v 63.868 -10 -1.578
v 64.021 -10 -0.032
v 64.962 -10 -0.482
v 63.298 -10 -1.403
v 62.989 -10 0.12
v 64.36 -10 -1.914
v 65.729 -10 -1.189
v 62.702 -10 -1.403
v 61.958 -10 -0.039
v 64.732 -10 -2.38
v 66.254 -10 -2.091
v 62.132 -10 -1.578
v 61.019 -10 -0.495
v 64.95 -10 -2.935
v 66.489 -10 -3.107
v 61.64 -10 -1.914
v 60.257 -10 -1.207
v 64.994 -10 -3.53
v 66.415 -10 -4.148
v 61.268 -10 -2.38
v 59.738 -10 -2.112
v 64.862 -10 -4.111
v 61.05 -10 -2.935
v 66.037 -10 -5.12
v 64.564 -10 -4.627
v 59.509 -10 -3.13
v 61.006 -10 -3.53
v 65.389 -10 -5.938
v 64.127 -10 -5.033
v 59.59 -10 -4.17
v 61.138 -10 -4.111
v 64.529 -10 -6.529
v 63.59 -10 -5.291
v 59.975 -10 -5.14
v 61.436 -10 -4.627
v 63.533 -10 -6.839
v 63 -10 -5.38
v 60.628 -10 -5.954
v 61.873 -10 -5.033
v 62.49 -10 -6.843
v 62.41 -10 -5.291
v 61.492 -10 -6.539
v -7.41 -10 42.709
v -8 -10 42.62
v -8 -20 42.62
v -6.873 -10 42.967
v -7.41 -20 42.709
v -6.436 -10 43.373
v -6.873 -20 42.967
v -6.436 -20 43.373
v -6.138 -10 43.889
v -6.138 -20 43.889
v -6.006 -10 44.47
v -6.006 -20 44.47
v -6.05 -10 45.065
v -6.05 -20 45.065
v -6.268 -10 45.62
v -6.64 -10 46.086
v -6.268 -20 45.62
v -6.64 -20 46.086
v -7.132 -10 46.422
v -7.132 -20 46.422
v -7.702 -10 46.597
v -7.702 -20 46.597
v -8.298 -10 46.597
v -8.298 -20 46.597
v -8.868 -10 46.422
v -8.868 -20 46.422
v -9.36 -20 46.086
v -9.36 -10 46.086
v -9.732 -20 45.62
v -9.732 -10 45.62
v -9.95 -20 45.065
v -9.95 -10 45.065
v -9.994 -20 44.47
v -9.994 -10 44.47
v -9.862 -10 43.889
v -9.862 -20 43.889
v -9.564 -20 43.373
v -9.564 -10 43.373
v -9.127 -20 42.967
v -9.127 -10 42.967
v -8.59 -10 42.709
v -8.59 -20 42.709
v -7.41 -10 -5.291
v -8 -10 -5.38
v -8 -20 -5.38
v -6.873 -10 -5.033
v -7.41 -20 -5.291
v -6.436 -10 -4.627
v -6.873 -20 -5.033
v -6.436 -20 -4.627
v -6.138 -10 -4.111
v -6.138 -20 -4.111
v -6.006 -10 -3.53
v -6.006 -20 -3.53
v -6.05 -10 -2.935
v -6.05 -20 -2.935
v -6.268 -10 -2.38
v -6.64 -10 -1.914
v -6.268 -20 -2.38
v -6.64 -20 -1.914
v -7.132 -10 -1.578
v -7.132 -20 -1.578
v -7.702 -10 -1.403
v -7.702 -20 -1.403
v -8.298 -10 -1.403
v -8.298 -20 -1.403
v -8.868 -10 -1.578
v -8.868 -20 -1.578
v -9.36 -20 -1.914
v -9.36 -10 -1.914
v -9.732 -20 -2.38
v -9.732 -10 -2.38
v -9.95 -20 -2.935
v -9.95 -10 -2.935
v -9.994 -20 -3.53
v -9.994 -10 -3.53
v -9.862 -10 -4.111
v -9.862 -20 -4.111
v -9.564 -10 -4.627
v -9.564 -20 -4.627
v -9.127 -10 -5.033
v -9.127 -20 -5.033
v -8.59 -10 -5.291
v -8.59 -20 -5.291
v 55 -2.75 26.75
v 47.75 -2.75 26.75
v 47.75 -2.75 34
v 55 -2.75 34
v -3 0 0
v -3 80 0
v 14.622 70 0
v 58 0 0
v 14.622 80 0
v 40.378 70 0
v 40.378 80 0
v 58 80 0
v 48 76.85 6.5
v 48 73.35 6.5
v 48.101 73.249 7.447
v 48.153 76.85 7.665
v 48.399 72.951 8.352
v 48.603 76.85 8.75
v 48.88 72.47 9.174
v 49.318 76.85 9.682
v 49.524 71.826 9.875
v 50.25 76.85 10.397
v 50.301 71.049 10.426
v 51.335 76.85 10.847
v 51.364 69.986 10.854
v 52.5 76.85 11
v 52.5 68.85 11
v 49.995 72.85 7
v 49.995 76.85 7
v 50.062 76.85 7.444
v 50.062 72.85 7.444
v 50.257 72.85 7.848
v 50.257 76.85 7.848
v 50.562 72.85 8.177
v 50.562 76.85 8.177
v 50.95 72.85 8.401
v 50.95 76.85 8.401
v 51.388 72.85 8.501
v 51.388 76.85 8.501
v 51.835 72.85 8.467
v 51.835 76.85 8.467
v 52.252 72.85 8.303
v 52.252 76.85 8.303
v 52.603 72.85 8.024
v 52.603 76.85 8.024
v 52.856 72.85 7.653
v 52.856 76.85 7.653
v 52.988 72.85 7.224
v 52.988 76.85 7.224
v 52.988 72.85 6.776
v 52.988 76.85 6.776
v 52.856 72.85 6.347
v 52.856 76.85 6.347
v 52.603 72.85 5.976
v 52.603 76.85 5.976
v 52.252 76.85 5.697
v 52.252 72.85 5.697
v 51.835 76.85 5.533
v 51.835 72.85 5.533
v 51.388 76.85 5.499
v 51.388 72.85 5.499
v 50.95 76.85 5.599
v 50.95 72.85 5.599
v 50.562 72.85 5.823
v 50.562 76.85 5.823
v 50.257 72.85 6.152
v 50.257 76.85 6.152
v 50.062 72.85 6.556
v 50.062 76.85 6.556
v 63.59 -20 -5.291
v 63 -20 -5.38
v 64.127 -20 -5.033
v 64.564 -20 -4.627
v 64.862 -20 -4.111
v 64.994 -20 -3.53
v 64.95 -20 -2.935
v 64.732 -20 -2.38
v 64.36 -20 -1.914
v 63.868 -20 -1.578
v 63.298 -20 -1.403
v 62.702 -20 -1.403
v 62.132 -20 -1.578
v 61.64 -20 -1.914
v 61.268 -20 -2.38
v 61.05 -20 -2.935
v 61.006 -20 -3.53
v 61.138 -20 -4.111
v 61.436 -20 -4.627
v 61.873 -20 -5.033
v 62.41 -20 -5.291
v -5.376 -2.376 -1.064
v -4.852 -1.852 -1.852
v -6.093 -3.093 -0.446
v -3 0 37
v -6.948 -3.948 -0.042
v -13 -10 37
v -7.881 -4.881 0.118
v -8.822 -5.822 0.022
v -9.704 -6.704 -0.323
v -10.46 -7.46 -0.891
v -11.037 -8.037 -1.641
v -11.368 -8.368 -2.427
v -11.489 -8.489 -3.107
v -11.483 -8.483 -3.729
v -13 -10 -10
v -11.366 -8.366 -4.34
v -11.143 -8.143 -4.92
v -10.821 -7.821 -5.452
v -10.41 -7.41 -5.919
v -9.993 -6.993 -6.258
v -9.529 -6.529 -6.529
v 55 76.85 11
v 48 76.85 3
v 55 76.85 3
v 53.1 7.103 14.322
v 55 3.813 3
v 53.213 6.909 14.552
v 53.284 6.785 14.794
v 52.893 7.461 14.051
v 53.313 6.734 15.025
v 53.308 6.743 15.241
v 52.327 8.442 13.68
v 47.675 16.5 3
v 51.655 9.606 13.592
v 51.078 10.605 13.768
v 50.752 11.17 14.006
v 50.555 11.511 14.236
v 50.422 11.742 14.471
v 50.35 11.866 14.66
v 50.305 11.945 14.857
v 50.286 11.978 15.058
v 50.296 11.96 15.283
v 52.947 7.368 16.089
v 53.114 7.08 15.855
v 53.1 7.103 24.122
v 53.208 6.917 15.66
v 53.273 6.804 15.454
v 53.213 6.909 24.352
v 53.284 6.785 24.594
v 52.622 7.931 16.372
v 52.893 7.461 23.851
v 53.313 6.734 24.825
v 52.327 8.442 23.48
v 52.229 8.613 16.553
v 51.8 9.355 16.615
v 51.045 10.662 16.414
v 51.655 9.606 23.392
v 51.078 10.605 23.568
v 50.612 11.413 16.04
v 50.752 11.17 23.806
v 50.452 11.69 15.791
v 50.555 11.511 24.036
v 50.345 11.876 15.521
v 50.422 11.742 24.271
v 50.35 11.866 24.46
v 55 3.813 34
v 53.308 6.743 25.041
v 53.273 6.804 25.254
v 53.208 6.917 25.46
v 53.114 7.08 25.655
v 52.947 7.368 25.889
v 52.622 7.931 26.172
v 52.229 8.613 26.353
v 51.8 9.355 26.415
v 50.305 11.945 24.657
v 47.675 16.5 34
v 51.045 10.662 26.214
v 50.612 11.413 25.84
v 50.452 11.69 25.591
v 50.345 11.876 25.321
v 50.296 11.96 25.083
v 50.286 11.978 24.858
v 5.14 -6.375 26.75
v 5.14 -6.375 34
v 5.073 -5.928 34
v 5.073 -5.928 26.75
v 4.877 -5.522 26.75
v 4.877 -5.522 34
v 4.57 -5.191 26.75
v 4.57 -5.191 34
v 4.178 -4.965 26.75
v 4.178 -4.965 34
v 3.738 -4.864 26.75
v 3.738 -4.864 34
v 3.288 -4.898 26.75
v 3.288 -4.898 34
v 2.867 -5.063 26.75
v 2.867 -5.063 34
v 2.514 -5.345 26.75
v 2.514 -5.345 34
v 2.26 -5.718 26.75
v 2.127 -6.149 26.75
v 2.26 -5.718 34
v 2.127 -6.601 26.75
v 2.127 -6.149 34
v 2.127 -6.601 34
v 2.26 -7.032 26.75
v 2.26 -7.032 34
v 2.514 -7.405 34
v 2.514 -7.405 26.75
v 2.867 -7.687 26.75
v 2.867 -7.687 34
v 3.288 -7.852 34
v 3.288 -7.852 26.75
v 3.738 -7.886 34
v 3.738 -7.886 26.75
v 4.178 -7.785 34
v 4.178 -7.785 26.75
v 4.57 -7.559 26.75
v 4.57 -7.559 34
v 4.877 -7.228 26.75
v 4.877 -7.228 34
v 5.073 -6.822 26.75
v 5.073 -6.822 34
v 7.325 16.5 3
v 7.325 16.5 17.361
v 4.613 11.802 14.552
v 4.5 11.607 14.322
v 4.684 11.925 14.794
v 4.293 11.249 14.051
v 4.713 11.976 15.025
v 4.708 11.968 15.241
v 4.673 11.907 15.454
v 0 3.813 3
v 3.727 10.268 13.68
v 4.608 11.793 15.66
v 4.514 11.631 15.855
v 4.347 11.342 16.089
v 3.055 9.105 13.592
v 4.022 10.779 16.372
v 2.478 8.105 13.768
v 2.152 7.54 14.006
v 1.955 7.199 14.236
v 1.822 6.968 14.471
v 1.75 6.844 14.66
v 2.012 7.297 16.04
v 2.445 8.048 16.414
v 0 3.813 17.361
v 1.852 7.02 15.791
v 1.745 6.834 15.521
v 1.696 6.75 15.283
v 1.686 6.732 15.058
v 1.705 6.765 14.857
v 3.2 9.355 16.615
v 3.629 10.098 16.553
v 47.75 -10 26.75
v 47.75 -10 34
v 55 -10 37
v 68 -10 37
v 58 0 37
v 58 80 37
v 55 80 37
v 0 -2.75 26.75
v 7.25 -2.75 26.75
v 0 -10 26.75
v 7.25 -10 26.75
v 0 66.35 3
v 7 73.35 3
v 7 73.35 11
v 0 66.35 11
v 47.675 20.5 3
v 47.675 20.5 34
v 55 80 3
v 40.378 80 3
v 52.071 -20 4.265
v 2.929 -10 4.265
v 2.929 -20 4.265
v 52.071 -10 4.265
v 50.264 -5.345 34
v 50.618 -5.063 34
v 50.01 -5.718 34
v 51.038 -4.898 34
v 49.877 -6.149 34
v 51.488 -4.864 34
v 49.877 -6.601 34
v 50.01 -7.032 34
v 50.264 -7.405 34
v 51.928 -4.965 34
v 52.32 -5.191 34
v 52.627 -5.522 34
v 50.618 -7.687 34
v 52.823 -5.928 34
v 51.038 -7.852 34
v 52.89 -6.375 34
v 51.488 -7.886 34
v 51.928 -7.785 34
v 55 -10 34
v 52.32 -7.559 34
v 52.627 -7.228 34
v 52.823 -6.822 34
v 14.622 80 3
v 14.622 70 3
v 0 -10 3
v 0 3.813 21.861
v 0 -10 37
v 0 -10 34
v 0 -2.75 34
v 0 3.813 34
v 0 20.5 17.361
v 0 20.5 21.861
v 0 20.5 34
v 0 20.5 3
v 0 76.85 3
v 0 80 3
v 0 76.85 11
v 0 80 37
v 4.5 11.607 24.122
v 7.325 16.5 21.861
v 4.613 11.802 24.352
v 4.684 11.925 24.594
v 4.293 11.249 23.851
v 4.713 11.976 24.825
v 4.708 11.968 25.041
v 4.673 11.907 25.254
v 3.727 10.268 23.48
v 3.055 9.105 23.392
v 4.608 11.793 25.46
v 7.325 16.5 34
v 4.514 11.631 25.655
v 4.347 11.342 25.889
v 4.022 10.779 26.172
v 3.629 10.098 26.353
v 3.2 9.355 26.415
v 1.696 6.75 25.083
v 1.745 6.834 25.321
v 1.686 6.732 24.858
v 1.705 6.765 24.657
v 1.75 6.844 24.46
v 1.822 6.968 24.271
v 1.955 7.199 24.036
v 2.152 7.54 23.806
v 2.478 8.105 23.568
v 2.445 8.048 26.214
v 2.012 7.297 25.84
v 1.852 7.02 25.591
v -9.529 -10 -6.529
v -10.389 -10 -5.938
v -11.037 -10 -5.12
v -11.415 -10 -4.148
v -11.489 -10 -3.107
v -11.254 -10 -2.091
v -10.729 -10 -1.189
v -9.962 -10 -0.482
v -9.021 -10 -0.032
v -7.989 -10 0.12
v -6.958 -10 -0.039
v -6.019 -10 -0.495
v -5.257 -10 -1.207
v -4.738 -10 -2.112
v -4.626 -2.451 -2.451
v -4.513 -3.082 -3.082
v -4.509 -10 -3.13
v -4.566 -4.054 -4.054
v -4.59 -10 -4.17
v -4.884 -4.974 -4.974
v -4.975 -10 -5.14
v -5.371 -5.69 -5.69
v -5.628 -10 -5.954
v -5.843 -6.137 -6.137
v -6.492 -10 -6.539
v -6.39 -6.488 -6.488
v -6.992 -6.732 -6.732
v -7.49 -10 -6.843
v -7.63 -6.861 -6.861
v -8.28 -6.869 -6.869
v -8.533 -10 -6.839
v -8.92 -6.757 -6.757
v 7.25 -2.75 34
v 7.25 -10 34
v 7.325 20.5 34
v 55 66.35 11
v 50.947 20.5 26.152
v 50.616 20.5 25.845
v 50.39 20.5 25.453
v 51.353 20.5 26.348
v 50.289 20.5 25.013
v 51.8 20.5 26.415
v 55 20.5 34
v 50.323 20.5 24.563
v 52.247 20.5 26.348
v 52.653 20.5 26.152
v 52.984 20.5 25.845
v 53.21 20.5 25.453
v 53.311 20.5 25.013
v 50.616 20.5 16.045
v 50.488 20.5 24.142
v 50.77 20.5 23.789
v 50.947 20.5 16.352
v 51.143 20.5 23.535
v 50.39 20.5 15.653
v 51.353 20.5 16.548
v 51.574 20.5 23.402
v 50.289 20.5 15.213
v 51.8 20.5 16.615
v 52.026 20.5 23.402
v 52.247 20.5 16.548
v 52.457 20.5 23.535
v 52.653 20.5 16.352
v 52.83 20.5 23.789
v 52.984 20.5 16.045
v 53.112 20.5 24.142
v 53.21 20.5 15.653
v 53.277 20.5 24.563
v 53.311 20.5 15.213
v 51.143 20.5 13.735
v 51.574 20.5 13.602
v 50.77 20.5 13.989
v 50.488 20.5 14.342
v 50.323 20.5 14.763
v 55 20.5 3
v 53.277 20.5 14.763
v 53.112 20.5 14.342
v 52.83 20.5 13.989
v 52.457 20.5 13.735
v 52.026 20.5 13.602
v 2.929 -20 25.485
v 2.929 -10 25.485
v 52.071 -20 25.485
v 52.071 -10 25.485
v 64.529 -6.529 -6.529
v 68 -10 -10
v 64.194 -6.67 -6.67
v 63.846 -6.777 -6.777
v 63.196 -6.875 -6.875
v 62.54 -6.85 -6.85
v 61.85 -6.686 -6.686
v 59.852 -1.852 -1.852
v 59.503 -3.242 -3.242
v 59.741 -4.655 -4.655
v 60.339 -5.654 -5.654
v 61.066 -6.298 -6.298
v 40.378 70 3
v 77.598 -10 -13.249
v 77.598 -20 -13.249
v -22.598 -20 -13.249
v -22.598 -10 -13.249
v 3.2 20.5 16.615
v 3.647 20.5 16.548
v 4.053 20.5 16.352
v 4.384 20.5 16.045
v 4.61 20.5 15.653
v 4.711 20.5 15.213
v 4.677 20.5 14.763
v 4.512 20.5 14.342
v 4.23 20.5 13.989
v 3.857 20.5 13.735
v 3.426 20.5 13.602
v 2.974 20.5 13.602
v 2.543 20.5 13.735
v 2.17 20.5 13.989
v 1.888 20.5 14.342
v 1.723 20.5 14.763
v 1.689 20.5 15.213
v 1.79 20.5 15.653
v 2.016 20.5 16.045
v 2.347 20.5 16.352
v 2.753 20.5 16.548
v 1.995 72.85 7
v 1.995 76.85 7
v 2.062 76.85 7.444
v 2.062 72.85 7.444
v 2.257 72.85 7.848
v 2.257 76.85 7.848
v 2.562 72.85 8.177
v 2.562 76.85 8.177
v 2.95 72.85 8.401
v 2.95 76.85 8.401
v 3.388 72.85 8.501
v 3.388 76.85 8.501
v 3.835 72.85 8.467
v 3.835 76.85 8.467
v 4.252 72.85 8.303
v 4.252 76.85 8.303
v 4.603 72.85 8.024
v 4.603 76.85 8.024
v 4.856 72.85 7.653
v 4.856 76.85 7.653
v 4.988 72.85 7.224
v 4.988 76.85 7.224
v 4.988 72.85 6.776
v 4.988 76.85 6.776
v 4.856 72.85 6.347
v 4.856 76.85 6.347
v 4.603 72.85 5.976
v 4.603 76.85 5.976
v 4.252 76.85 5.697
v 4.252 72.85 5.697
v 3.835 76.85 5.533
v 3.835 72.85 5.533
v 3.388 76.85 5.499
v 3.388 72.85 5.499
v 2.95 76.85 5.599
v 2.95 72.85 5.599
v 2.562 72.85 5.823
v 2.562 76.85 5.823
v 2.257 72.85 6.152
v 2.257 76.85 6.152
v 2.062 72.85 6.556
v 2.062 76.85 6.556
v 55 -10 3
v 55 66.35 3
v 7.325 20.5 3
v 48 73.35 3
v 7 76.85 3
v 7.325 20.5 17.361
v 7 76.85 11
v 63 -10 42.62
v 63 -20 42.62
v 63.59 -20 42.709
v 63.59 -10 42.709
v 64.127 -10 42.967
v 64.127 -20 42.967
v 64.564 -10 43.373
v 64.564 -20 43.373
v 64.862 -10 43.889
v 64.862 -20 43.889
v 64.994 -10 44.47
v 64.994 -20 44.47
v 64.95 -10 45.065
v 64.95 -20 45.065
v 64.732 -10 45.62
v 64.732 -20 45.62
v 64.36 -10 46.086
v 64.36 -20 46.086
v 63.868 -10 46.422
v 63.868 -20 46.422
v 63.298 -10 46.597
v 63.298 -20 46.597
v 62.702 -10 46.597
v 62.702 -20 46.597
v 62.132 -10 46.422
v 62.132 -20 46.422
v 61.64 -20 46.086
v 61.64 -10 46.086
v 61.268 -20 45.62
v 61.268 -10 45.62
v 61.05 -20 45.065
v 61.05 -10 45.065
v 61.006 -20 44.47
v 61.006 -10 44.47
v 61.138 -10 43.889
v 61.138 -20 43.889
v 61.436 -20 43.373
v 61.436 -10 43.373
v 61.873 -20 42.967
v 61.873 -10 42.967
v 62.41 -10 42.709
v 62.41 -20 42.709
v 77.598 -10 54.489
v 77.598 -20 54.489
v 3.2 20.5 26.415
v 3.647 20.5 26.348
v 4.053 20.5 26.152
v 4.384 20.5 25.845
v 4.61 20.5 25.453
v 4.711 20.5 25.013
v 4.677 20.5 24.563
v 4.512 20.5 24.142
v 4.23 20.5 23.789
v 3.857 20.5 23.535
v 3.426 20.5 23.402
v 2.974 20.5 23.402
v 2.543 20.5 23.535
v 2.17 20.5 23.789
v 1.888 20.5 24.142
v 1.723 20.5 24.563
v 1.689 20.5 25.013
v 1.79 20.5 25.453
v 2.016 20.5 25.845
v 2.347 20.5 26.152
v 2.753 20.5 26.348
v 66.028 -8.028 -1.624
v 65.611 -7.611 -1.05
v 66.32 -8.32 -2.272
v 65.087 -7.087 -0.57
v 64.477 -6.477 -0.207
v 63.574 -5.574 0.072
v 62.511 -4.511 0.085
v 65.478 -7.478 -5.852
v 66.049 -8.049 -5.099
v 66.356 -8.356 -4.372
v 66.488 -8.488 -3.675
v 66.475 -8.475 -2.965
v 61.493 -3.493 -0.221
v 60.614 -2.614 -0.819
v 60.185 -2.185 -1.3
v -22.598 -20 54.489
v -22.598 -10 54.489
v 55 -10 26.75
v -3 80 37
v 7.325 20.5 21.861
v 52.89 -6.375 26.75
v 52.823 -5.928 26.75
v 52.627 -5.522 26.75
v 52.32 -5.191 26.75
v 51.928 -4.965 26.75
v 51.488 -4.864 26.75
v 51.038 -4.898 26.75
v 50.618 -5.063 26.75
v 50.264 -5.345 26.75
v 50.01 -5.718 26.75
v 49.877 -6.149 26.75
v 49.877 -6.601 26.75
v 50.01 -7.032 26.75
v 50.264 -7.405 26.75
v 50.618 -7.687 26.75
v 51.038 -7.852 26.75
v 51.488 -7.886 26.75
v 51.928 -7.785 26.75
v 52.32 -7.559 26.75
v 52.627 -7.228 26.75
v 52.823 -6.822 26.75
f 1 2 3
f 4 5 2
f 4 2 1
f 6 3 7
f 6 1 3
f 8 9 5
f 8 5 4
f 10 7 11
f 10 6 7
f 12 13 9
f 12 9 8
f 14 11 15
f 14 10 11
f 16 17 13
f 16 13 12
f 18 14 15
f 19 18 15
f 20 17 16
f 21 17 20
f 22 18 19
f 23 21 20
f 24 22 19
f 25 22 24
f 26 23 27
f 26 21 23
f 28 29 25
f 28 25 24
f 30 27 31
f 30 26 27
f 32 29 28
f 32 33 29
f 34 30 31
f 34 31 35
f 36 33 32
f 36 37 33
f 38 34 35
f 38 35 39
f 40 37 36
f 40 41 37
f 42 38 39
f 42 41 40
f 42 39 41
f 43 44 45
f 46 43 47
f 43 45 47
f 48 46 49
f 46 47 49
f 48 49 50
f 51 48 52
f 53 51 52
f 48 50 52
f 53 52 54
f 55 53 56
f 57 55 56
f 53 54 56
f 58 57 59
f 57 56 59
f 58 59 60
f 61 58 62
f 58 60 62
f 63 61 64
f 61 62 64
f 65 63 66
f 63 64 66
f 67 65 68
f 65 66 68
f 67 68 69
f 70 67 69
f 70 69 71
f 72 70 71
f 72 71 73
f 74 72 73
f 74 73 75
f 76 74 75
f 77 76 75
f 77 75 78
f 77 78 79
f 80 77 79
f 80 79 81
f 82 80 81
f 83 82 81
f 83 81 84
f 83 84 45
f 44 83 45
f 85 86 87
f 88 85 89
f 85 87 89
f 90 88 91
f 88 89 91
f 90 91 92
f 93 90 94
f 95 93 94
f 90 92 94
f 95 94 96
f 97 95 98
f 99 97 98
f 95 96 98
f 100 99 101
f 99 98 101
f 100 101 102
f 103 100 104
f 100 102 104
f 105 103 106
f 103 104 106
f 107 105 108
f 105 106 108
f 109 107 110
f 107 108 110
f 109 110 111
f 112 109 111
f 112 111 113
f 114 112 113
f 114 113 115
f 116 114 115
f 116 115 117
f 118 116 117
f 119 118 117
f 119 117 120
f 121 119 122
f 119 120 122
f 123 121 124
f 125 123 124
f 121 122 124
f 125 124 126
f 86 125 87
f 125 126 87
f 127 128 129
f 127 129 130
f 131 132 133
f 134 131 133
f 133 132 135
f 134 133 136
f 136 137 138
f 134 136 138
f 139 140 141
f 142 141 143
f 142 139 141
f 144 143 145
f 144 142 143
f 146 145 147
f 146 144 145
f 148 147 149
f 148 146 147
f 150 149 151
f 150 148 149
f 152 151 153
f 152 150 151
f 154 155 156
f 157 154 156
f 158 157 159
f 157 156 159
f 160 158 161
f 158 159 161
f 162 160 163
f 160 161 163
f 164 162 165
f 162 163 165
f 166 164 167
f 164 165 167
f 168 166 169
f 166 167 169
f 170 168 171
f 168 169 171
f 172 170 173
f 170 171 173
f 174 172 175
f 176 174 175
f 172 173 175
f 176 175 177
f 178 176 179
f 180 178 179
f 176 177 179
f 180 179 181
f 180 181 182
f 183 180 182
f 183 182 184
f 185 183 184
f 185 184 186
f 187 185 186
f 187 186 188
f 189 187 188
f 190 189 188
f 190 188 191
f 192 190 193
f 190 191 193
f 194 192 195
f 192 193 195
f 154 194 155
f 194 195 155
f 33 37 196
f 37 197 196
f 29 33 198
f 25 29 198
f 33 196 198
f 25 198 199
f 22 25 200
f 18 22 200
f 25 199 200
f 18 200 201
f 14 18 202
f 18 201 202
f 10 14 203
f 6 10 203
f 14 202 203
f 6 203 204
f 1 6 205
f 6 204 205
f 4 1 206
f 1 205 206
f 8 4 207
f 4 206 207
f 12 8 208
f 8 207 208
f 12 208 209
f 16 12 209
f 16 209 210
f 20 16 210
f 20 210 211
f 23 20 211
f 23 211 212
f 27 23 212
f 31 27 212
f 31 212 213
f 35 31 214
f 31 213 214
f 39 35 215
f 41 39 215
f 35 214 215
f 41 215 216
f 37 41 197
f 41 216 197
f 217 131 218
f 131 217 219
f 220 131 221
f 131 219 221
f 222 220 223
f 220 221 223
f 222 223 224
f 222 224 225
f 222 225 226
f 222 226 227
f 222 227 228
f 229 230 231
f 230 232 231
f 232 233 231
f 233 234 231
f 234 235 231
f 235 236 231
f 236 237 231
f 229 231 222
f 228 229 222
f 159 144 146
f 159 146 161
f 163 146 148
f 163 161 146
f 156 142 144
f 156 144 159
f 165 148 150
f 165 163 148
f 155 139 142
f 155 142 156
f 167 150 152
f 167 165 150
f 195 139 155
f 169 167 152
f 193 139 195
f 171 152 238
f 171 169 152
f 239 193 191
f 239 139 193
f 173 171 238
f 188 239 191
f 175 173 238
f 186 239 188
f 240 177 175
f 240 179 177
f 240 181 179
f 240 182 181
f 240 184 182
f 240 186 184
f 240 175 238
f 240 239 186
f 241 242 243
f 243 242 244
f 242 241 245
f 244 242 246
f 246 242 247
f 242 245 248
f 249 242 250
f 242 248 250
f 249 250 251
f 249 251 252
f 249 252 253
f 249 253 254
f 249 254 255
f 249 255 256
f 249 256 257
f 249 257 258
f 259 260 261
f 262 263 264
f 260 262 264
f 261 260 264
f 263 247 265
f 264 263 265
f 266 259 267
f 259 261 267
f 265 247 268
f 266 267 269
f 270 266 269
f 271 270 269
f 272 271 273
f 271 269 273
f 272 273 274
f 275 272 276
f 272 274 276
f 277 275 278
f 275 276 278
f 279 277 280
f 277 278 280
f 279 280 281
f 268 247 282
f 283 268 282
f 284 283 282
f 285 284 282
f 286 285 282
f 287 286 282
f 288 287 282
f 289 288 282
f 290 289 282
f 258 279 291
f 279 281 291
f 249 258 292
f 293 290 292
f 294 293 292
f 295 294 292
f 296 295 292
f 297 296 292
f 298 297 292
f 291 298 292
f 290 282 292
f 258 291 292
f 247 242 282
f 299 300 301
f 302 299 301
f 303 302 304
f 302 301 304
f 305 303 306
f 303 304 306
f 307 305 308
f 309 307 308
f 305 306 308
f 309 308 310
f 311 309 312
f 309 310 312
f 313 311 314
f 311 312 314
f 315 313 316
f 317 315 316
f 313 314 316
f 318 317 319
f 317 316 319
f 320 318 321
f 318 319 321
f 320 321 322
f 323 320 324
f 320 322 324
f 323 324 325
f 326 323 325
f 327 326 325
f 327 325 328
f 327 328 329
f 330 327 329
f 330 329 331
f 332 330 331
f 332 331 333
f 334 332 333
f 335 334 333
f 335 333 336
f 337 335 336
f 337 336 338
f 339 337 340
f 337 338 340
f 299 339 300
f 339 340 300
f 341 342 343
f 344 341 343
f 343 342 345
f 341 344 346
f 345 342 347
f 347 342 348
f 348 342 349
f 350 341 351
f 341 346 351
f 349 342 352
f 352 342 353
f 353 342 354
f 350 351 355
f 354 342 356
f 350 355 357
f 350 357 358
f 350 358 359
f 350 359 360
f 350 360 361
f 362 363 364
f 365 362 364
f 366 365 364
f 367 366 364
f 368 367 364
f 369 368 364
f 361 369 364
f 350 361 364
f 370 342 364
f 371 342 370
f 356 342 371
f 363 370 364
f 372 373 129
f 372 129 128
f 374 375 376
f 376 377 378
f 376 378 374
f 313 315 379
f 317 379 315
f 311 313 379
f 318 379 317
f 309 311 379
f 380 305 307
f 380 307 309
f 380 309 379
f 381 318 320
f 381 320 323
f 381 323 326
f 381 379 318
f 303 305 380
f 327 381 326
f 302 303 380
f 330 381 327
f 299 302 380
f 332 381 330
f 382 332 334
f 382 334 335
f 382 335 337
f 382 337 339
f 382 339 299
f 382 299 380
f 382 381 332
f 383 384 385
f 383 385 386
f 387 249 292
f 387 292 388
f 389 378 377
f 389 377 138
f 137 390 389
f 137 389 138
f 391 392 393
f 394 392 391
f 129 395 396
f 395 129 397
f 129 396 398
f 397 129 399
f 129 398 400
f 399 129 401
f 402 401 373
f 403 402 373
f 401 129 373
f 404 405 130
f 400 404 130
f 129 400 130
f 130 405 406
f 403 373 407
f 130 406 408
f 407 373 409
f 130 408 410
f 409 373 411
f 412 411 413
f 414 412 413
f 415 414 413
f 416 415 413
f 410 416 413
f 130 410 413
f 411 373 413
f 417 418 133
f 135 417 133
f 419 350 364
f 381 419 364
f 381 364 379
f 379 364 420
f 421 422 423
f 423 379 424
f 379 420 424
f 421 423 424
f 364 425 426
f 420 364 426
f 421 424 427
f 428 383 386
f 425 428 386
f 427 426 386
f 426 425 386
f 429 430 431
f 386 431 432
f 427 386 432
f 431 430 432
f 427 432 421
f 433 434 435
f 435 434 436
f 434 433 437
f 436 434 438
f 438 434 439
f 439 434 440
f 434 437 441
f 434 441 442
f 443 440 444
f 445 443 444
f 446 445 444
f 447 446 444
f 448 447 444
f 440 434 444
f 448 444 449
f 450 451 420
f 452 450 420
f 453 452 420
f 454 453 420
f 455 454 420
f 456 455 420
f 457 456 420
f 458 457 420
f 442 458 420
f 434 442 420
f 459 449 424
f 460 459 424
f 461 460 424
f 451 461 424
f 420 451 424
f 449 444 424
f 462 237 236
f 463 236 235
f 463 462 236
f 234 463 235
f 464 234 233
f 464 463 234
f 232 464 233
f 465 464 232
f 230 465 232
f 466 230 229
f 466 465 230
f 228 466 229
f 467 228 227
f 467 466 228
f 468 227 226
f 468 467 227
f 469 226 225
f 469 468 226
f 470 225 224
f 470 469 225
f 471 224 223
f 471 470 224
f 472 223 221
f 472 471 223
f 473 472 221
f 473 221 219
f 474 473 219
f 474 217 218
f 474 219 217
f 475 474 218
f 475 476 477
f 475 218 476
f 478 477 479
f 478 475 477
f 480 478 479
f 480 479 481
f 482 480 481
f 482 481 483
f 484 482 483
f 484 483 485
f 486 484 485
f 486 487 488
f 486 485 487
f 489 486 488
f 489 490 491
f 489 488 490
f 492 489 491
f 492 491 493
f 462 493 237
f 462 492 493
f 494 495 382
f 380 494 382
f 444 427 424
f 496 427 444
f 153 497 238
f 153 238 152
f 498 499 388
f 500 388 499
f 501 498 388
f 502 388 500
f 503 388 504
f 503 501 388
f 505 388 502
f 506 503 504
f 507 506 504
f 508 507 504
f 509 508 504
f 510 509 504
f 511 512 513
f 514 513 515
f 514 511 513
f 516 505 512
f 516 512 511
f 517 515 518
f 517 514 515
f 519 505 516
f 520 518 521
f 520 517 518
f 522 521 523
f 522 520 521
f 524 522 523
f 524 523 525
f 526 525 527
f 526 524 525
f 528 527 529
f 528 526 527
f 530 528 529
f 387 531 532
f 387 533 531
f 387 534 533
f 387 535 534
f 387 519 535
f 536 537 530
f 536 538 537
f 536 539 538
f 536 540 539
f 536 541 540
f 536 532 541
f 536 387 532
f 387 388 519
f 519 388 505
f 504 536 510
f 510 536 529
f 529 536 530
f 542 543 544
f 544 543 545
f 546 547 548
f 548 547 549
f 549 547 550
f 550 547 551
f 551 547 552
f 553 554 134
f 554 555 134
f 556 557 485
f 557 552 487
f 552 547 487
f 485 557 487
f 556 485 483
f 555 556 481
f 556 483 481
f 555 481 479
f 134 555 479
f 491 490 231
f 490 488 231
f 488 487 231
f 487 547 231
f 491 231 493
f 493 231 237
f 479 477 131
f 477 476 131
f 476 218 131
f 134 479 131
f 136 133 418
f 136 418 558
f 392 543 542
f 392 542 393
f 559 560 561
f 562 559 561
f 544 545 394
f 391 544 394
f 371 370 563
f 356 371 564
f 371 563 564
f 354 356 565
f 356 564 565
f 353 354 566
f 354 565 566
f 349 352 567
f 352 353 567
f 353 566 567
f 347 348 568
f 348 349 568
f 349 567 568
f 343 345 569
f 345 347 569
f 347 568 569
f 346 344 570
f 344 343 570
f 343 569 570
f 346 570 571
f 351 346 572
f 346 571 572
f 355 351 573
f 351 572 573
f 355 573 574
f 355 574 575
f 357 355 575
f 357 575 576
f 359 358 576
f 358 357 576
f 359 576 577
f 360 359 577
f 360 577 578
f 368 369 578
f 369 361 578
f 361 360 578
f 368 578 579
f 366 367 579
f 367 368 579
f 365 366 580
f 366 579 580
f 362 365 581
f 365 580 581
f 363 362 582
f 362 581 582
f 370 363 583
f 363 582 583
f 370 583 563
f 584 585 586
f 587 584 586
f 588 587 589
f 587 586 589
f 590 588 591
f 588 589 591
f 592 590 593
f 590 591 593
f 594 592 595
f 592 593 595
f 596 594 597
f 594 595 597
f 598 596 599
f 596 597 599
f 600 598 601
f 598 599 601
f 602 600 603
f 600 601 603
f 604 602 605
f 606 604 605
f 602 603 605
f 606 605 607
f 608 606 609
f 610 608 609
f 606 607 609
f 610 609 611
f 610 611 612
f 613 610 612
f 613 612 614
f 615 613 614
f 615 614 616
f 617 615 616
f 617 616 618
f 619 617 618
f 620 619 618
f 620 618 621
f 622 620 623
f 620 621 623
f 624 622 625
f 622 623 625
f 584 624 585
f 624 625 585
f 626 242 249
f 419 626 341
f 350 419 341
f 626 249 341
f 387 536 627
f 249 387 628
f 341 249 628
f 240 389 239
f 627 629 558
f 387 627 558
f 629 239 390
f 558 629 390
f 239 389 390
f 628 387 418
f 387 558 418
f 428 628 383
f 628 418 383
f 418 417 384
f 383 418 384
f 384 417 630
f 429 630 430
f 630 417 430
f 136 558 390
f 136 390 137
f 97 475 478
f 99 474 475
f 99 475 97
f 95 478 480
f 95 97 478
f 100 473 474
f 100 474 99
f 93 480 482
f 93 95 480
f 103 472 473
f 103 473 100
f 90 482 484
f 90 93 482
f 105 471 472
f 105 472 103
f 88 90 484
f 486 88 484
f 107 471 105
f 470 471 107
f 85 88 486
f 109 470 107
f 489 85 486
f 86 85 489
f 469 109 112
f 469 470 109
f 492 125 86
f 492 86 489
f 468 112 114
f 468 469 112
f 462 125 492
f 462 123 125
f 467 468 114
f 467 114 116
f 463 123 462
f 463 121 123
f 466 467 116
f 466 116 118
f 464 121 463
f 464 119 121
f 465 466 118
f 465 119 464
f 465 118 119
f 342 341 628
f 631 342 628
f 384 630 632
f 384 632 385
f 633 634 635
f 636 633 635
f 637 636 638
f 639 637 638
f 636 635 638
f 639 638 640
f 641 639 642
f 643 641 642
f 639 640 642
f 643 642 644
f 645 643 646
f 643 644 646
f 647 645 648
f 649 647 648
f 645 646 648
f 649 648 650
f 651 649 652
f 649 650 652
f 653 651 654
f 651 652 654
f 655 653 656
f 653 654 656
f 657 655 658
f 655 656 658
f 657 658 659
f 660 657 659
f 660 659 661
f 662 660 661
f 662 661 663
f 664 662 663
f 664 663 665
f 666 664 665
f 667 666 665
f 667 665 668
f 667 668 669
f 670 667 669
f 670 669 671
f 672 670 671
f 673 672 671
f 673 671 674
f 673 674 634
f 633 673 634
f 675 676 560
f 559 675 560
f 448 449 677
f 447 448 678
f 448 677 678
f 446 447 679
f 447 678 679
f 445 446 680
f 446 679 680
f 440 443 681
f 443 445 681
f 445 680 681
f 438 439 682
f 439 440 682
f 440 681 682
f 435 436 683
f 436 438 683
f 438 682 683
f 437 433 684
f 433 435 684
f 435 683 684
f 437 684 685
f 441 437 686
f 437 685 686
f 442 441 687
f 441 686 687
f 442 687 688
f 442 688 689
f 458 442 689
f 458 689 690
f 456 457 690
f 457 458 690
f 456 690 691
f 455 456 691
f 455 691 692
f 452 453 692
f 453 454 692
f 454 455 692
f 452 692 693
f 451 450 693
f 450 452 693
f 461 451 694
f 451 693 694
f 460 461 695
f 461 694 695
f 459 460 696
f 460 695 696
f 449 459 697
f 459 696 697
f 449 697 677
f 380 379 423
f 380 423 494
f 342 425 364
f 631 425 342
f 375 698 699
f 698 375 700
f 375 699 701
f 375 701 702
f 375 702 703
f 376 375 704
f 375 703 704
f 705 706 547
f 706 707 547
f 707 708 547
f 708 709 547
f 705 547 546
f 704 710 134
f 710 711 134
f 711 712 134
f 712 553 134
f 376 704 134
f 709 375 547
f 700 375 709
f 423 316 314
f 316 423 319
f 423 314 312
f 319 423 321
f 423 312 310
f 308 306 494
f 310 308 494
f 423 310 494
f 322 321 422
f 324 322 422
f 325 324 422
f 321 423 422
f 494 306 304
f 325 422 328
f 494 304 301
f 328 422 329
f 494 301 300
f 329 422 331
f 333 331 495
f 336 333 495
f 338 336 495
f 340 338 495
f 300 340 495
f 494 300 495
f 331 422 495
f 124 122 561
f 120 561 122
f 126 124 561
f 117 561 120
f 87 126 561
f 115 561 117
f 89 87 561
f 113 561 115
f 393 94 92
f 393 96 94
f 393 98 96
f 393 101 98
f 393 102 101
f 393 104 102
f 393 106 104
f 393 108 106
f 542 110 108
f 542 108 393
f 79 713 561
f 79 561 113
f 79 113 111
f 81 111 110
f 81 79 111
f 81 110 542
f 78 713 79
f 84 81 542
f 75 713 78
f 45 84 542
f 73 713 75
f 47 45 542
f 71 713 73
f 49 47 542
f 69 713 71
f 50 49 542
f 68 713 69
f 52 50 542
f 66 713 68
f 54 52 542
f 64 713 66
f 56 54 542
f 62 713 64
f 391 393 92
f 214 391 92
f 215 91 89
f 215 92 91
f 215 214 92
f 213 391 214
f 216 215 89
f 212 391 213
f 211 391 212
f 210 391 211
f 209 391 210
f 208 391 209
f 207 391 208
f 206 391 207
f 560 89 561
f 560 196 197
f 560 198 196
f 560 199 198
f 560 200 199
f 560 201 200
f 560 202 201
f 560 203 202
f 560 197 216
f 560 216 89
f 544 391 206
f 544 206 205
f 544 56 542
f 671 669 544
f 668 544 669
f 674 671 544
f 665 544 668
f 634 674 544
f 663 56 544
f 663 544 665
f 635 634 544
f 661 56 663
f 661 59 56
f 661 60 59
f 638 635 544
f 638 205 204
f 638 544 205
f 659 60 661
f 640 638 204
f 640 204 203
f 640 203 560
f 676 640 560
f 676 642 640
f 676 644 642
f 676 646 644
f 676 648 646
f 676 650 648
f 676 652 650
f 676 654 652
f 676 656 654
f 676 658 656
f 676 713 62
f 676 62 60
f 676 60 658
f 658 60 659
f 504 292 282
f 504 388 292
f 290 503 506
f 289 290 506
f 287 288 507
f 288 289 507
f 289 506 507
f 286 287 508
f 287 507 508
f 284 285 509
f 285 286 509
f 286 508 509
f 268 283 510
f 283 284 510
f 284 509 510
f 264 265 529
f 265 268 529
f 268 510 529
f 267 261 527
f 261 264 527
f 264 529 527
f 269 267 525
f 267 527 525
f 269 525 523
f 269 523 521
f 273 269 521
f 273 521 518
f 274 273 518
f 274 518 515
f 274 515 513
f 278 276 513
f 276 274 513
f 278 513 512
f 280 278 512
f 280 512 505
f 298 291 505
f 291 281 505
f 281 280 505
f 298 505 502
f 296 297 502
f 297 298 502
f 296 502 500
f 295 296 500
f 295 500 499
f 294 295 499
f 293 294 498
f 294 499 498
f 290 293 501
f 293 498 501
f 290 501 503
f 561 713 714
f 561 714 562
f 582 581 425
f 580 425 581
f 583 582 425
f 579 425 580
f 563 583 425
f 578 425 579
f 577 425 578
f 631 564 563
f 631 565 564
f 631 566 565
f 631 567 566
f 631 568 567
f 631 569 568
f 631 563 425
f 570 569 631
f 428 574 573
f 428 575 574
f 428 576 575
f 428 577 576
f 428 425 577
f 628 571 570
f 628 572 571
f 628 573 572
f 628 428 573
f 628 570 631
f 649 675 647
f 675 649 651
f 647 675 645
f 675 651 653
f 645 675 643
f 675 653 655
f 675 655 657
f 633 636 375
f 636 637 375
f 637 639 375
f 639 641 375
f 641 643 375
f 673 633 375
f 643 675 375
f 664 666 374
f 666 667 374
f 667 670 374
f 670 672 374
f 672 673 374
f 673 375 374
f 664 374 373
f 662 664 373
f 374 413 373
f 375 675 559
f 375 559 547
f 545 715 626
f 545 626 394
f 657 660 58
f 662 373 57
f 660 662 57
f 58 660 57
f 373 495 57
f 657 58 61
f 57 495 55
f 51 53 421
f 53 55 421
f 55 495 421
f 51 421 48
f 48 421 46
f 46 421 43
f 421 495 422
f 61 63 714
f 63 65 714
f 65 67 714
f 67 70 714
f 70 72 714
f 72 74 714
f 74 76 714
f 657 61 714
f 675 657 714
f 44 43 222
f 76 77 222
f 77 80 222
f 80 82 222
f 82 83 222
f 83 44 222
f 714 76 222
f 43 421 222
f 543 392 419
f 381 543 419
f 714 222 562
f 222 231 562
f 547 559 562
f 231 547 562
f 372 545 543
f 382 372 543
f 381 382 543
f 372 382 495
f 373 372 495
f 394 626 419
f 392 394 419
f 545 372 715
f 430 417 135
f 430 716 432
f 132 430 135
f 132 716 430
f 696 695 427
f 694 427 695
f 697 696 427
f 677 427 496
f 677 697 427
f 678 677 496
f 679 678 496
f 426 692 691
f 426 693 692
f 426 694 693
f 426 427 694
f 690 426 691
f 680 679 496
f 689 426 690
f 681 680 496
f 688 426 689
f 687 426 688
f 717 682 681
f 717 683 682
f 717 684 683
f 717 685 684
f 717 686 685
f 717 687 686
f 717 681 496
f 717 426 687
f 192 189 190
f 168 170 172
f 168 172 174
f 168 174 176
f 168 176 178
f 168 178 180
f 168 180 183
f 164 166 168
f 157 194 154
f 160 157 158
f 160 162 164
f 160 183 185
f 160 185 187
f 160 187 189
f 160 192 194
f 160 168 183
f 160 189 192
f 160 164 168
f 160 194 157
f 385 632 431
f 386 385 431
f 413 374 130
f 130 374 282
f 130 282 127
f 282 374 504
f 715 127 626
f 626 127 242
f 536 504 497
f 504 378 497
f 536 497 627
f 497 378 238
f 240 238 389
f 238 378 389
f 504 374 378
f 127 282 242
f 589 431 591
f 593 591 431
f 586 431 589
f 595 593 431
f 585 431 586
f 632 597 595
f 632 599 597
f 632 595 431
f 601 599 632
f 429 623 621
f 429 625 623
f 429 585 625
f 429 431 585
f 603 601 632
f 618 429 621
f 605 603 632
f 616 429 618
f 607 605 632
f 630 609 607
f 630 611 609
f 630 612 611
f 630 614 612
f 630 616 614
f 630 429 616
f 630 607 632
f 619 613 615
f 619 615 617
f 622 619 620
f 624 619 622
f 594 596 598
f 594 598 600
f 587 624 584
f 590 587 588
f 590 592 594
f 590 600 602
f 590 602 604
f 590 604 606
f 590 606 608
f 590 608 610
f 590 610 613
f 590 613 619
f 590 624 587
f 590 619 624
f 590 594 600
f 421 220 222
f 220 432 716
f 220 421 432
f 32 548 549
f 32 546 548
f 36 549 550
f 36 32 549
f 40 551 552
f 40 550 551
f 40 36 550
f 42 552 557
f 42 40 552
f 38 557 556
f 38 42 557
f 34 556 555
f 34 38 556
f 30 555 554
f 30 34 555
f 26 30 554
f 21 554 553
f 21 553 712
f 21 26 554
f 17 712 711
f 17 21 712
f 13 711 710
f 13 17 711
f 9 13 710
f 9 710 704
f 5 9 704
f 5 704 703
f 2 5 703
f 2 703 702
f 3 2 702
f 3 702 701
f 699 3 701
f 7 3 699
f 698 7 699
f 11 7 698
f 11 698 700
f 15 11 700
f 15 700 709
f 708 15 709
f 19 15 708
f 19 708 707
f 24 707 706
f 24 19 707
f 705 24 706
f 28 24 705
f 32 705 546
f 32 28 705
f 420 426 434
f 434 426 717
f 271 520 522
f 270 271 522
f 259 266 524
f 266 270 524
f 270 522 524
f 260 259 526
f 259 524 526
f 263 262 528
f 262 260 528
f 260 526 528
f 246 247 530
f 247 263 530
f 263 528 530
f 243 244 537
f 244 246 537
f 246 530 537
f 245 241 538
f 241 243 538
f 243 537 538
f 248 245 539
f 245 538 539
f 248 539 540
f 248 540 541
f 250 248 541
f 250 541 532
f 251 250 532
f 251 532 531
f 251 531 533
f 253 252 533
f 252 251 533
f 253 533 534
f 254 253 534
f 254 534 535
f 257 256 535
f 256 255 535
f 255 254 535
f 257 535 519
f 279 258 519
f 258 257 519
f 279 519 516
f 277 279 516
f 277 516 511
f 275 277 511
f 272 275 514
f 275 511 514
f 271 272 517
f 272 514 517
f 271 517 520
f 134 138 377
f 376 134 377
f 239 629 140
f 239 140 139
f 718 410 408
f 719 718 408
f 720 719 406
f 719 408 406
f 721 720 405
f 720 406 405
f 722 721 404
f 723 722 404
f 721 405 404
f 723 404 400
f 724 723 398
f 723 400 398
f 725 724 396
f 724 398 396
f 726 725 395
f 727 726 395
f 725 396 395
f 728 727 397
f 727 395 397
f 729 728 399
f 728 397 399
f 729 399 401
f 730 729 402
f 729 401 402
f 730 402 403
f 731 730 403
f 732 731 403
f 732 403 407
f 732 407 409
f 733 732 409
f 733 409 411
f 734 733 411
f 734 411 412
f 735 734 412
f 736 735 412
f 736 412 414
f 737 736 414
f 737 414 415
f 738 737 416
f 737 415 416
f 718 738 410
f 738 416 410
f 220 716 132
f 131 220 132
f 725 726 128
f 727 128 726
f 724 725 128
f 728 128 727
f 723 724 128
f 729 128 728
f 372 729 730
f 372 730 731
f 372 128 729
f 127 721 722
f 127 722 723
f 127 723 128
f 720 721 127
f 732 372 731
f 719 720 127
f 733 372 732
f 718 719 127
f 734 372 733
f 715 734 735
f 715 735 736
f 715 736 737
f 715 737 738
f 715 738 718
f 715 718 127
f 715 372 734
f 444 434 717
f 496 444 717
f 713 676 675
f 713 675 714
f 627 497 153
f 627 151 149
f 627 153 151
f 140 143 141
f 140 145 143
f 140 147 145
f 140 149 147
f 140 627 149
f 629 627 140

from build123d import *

# Parameters (mm, degrees)
SKETCH1_W                = 55
SKETCH1_H                = 80
BACKPANEL_DEPTH          = 3
SKETCH2_W                = 7.325
SKETCH2_H                = 4
MOTORMOUNT_DEPTH         = 34
SKETCH3_W                = 37
SKETCH3_H                = 80
SIDEPANEL2_DEPTH         = 3
SKETCH4_W                = 37
SKETCH4_H                = 80
SIDEPANEL1_DEPTH         = 3
MOTORSUPPORTANGLES_DEPTH = 34
MOTORHOLESSET1_REACH     = 92.957
SKETCH5_R                = 1.515
MOTORHOLESSET2_REACH     = 92.957
SKETCH5_3_R              = 1.515
SKETCH7_W                = 61
SKETCH7_H                = 37
BOTTOMPLATE_DEPTH        = 3
SKETCH8_W                = 61
SKETCH8_H                = 3
CUT_EXTRUDE1_DEPTH       = 37
SKETCH20_W               = 100.196149356
SKETCH20_H               = 67.738241818
SKETCH20_R               = 2
BOSS_EXTRUDE8_DEPTH      = 20
BOSS_EXTRUDE10_DEPTH     = 10
BOSS_EXTRUDE11_DEPTH     = 8
SKETCH24_R               = 1.505
CUT_EXTRUDE6_DEPTH       = 4
SKETCH25_W               = 7.25
SKETCH25_H               = 7.25
BOSS_EXTRUDE12_DEPTH     = 7.25
SKETCH26_R               = 1.515
CUT_EXTRUDE7_DEPTH       = 7.25
CUT_EXTRUDE8_REACH       = 113.941
SKETCH27_W               = 7.325
SKETCH27_H               = 4.500198619
FILLET3_R                = 4.5
SKETCH28_W               = 55
SKETCH28_H               = 16.687272165
CUT_EXTRUDE9_DEPTH       = 3
SKETCH30_W               = 100.196149356
SKETCH30_H               = 67.738241818
CUT_EXTRUDE10_DEPTH      = 10
CHAMFER1_SIZE            = 10
CHAMFER2_SIZE            = 10
CHAMFER3_SIZE            = 10
SKETCH31_R               = 3.5
CUT_EXTRUDE11_DEPTH      = 10
SKETCH32_W               = 49.142704434
SKETCH32_H               = 21.220713278
CUT_EXTRUDE12_DEPTH      = 10
SKETCH33_W               = 25.755482036
SKETCH33_H               = 3
CUT_EXTRUDE13_DEPTH      = 10


with BuildPart() as part:
    # Sketch1 → BackPanel (new body)
    with BuildSketch(Plane.XY):
        with Locations((27.5, 40)):
            Rectangle(SKETCH1_W, SKETCH1_H)
    extrude(amount=BACKPANEL_DEPTH)

    # Sketch2 → MotorMount (add)
    with BuildSketch(Plane.XY.offset(3)):
        with Locations((3.6625, 18.5)):
            Rectangle(SKETCH2_W, SKETCH2_H)
        with Locations((51.3375, 18.5)):
            Rectangle(SKETCH2_W, SKETCH2_H)
    extrude(amount=MOTORMOUNT_DEPTH)

    # Sketch3 → SidePanel2 (add)
    with BuildSketch(Plane.ZY):
        with Locations((18.5, 40)):
            Rectangle(SKETCH3_W, SKETCH3_H)
    extrude(amount=SIDEPANEL2_DEPTH)

    # Sketch4 → SidePanel1 (add)
    with BuildSketch(Plane(origin=(55, 0, 0), x_dir=(0, 0, -1), z_dir=(1, 0, 0))):
        with Locations((-18.5, 40)):
            Rectangle(SKETCH4_W, SKETCH4_H)
    extrude(amount=SIDEPANEL1_DEPTH)

    # Sketch6 → MotorSupportAngles (add)
    with BuildSketch(Plane.XY.offset(37)):
        Polygon((7.325, 16.5), (0, 3.812727835), (0, 16.5), align=None)
        Polygon((47.675, 16.5), (55, 16.5), (55, 3.812727835), align=None)
    extrude(amount=-MOTORSUPPORTANGLES_DEPTH)

    # MotorHolesSet1: up to this plane
    motorholesset1_end = Plane(origin=(7.325, 16.5, -11.65), z_dir=(0.866025403784438, -0.5000000000000012, 0))
    # Sketch5 → MotorHolesSet1 (cut, up to the surface)
    with BuildSketch(Plane(origin=(0, 20.5, 0), x_dir=(1, 0, 0), z_dir=(0, 1, 0)), mode=Mode.PRIVATE) as motorholesset1_sk1:
        with Locations(Location((3.2, -15.1, 0), (0, 0, 270))):
            Circle(SKETCH5_R)
    motorholesset1_tool1 = split(extrude(motorholesset1_sk1.sketch, amount=-MOTORHOLESSET1_REACH, mode=Mode.PRIVATE), bisect_by=motorholesset1_end, keep=Keep.BOTH, mode=Mode.PRIVATE)
    add(motorholesset1_tool1.solids().sort_by_distance((3.2, 20.5, 15.1))[0], mode=Mode.SUBTRACT)
    # Sketch5 → MotorHolesSet1 (cut, up to the surface)
    with BuildSketch(Plane(origin=(0, 20.5, 0), x_dir=(1, 0, 0), z_dir=(0, 1, 0)), mode=Mode.PRIVATE) as motorholesset1_sk2:
        with Locations(Location((3.2, -24.9, 0), (0, 0, 270))):
            Circle(SKETCH5_R)
    motorholesset1_tool2 = split(extrude(motorholesset1_sk2.sketch, amount=-MOTORHOLESSET1_REACH, mode=Mode.PRIVATE), bisect_by=motorholesset1_end, keep=Keep.BOTH, mode=Mode.PRIVATE)
    add(motorholesset1_tool2.solids().sort_by_distance((3.2, 20.5, 24.9))[0], mode=Mode.SUBTRACT)

    # MotorHolesSet2: up to this plane
    motorholesset2_end = Plane(origin=(55, 3.812727835, -11.65), z_dir=(-0.866025403784438, -0.5000000000000011, 0))
    # Sketch5<3> → MotorHolesSet2 (cut, up to the surface)
    with BuildSketch(Plane(origin=(0, 20.5, 0), x_dir=(1, 0, 0), z_dir=(0, 1, 0)), mode=Mode.PRIVATE) as motorholesset2_sk1:
        with Locations(Location((51.8, -15.1, 0), (0, 0, 270))):
            Circle(SKETCH5_3_R)
    motorholesset2_tool1 = split(extrude(motorholesset2_sk1.sketch, amount=-MOTORHOLESSET2_REACH, mode=Mode.PRIVATE), bisect_by=motorholesset2_end, keep=Keep.BOTH, mode=Mode.PRIVATE)
    add(motorholesset2_tool1.solids().sort_by_distance((51.8, 20.5, 15.1))[0], mode=Mode.SUBTRACT)
    # Sketch5<3> → MotorHolesSet2 (cut, up to the surface)
    with BuildSketch(Plane(origin=(0, 20.5, 0), x_dir=(1, 0, 0), z_dir=(0, 1, 0)), mode=Mode.PRIVATE) as motorholesset2_sk2:
        with Locations(Location((51.8, -24.9, 0), (0, 0, 270))):
            Circle(SKETCH5_3_R)
    motorholesset2_tool2 = split(extrude(motorholesset2_sk2.sketch, amount=-MOTORHOLESSET2_REACH, mode=Mode.PRIVATE), bisect_by=motorholesset2_end, keep=Keep.BOTH, mode=Mode.PRIVATE)
    add(motorholesset2_tool2.solids().sort_by_distance((51.8, 20.5, 24.9))[0], mode=Mode.SUBTRACT)

    # Sketch7 → BottomPlate (add)
    with BuildSketch(Plane.XZ):
        with Locations((27.5, 18.5)):
            Rectangle(SKETCH7_W, SKETCH7_H)
    extrude(amount=BOTTOMPLATE_DEPTH)

    # Sketch8 → Cut-Extrude1 (cut)
    with BuildSketch(Plane.XY.offset(37)):
        with Locations((27.5, -1.5)):
            Rectangle(SKETCH8_W, SKETCH8_H)
    extrude(amount=-CUT_EXTRUDE1_DEPTH, mode=Mode.SUBTRACT)



with BuildPart() as body_2:
    # Sketch20 → Boss-Extrude8 (new body)
    with BuildSketch(Plane(origin=(0, -30, 0), x_dir=(-1, 0, 0), z_dir=(0, -1, 0))):
        with Locations((-27.5, -20.61971831)):
            Rectangle(SKETCH20_W, SKETCH20_H)
        with Locations(Location((8, -44.61971831, 0), (0, 0, 90))):
            Circle(SKETCH20_R, mode=Mode.SUBTRACT)
        with Locations(Location((-63, -44.61971831, 0), (0, 0, 90))):
            Circle(SKETCH20_R, mode=Mode.SUBTRACT)
        with Locations(Location((-63, 3.38028169, 0), (0, 0, 90))):
            Circle(SKETCH20_R, mode=Mode.SUBTRACT)
        with Locations(Location((8, 3.38028169, 0), (0, 0, 90))):
            Circle(SKETCH20_R, mode=Mode.SUBTRACT)
    extrude(amount=-BOSS_EXTRUDE8_DEPTH)


with BuildPart() as part_1:
    add(part.part)

    add(body_2.part)  # Boss-Extrude10 merges body 2
    # Sketch21 → Boss-Extrude10 (add)
    with BuildSketch(Plane.XZ):
        Polygon((-3, 0), (58, 0), (58, 37), (55, 37), (55, 3), (0, 3), (0, 37), (-3, 37), align=None)
    extrude(amount=BOSS_EXTRUDE10_DEPTH)

    # Sketch22 → Boss-Extrude11 (add)
    with BuildSketch(Plane.XY.offset(3)):
        Polygon((0, 76.85), (7, 76.85), (7, 73.35), (0, 66.35), align=None)
        Polygon((55, 76.85), (55, 66.35), (48, 73.35), (48, 76.85), align=None)
    extrude(amount=BOSS_EXTRUDE11_DEPTH)

    # Sketch24 → Cut-Extrude6 (cut)
    with BuildSketch(Plane(origin=(0, 76.85, 0), x_dir=(1, 0, 0), z_dir=(0, 1, 0))):
        with Locations(Location((3.5, -7, 0), (0, 0, 180))):
            Circle(SKETCH24_R)
        with Locations(Location((51.5, -7, 0), (0, 0, 180))):
            Circle(SKETCH24_R)
    extrude(amount=-CUT_EXTRUDE6_DEPTH, mode=Mode.SUBTRACT)

    # Sketch25 → Boss-Extrude12 (add)
    with BuildSketch(Plane(origin=(0, -10, 0), x_dir=(1, 0, 0), z_dir=(0, 1, 0))):
        with Locations((3.625, -30.375)):
            Rectangle(SKETCH25_W, SKETCH25_H)
        with Locations((51.375, -30.375)):
            Rectangle(SKETCH25_W, SKETCH25_H)
    extrude(amount=BOSS_EXTRUDE12_DEPTH)

    # Sketch26 → Cut-Extrude7 (cut)
    with BuildSketch(Plane.XY.offset(34)):
        with Locations((3.625, -6.375)):
            Circle(SKETCH26_R)
        with Locations((51.375, -6.375)):
            Circle(SKETCH26_R)
    extrude(amount=-CUT_EXTRUDE7_DEPTH, mode=Mode.SUBTRACT)

    # Cut-Extrude8: up to this plane
    cut_extrude8_end = Plane(origin=(7.325, 16.5, -11.65), z_dir=(0.866025403784438, -0.5000000000000012, 0))
    # Sketch27 → Cut-Extrude8 (cut, up to the surface)
    with BuildSketch(Plane(origin=(0, 20.5, 0), x_dir=(1, 0, 0), z_dir=(0, 1, 0)), mode=Mode.PRIVATE) as cut_extrude8_sk1:
        with Locations((3.6625, -19.611135977)):
            Rectangle(SKETCH27_W, SKETCH27_H)
    cut_extrude8_tool1 = split(extrude(cut_extrude8_sk1.sketch, amount=-CUT_EXTRUDE8_REACH, mode=Mode.PRIVATE), bisect_by=cut_extrude8_end, keep=Keep.BOTH, mode=Mode.PRIVATE)
    add(cut_extrude8_tool1.solids().sort_by_distance((3.6625, 20.5, 19.611136))[0], mode=Mode.SUBTRACT)

    # Fillet3
    fillet3_edges = [part_1.edges().sort_by_distance(p)[0] for p in [
        (48, 75.1, 11),
    ]]
    fillet(fillet3_edges, radius=FILLET3_R)

    # Sketch28 → Cut-Extrude9 (cut)
    with BuildSketch(Plane.XY.offset(37)):
        with Locations((27.5, 12.156363918)):
            Rectangle(SKETCH28_W, SKETCH28_H)
    extrude(amount=-CUT_EXTRUDE9_DEPTH, mode=Mode.SUBTRACT)

    # Sketch30 → Cut-Extrude10 (cut)
    with BuildSketch(Plane.XZ.offset(30)):
        with Locations((27.5, 20.61971831)):
            Rectangle(SKETCH30_W, SKETCH30_H)
    extrude(amount=-CUT_EXTRUDE10_DEPTH, mode=Mode.SUBTRACT)

    # Chamfer1
    chamfer1_edges = [part_1.edges().sort_by_distance(p)[0] for p in [
        (-3, -10, 18.5),
    ]]
    chamfer(chamfer1_edges, length=CHAMFER1_SIZE)

    # Chamfer2
    chamfer2_edges = [part_1.edges().sort_by_distance(p)[0] for p in [
        (58, -10, 18.5),
    ]]
    chamfer(chamfer2_edges, length=CHAMFER2_SIZE)

    # Chamfer3
    # the kernel refuses this chamfer: 10 mm, written as the material it adds along each edge
    with BuildSketch(Plane(origin=(-38.71682988, -10, 0), x_dir=(0, -0.027495876610586317, -0.9996219169112968), z_dir=(1, 0, 0))) as chamfer3_piece_1_section:
        Polygon((CHAMFER3_SIZE * 0.999621916911, CHAMFER3_SIZE * 0.0274958766106), (-CHAMFER3_SIZE * 0.0274958766106, CHAMFER3_SIZE * 0.999621916911), (0, 0), align=None)
    chamfer3_piece_1 = extrude(amount=132.433659759, mode=Mode.PRIVATE)
    chamfer3_piece_1 = split(chamfer3_piece_1, bisect_by=Plane(origin=(-8.165213201, -5.165213201, -8.521451905), z_dir=(0.7071067811865476, -0.7071067811865476, 0)), keep=Keep.TOP, mode=Mode.PRIVATE)
    chamfer3_piece_1 = chamfer3_piece_1 - Plane(origin=(-8, -8.616619282, -3.38028169), x_dir=(0, 0, -1), z_dir=(0, -1, 0)) * Cylinder(2, 305, mode=Mode.PRIVATE)
    chamfer3_piece_1 = split(chamfer3_piece_1, bisect_by=Plane(origin=(-3, -8.616619282, -8.521451905), z_dir=(-1, 0, 0)), keep=Keep.TOP, mode=Mode.PRIVATE)
    add(chamfer3_piece_1)
    with BuildSketch(Plane(origin=(-38.71682988, -10, 0), x_dir=(0, -0.027495876610586317, -0.9996219169112968), z_dir=(1, 0, 0))) as chamfer3_piece_2_section:
        Polygon((CHAMFER3_SIZE * 0.999621916911, CHAMFER3_SIZE * 0.0274958766106), (-CHAMFER3_SIZE * 0.0274958766106, CHAMFER3_SIZE * 0.999621916911), (0, 0), align=None)
    chamfer3_piece_2 = extrude(amount=132.433659759, mode=Mode.PRIVATE)
    chamfer3_piece_2 = split(chamfer3_piece_2, bisect_by=Plane(origin=(-3, -6.7021107, -3.297961008), z_dir=(1, 0, 0)), keep=Keep.TOP, mode=Mode.PRIVATE)
    chamfer3_piece_2 = split(chamfer3_piece_2, bisect_by=Plane(origin=(58, -6.7021107, -3.297961008), z_dir=(-1, 0, 0)), keep=Keep.TOP, mode=Mode.PRIVATE)
    add(chamfer3_piece_2)
    with BuildSketch(Plane(origin=(-38.71682988, -10, 0), x_dir=(0, -0.027495876610586317, -0.9996219169112968), z_dir=(1, 0, 0))) as chamfer3_piece_3_section:
        Polygon((CHAMFER3_SIZE * 0.999621916911, CHAMFER3_SIZE * 0.0274958766106), (-CHAMFER3_SIZE * 0.0274958766106, CHAMFER3_SIZE * 0.999621916911), (0, 0), align=None)
    chamfer3_piece_3 = extrude(amount=132.433659759, mode=Mode.PRIVATE)
    chamfer3_piece_3 = split(chamfer3_piece_3, bisect_by=Plane(origin=(64.879020319, -6.879020319, -8.521451905), z_dir=(-0.7071067811865476, -0.7071067811865476, 0)), keep=Keep.TOP, mode=Mode.PRIVATE)
    chamfer3_piece_3 = chamfer3_piece_3 - Plane(origin=(63, -8.616619283, -3.38028169), x_dir=(0, 0, -1), z_dir=(0, -1, 0)) * Cylinder(2, 305, mode=Mode.PRIVATE)
    chamfer3_piece_3 = split(chamfer3_piece_3, bisect_by=Plane(origin=(58, -8.616619283, -8.521451905), z_dir=(1, 0, 0)), keep=Keep.TOP, mode=Mode.PRIVATE)
    add(chamfer3_piece_3)

    # Sketch31 → Cut-Extrude11 (cut)
    with BuildSketch(Plane(origin=(0, -10, 0), x_dir=(1, 0, 0), z_dir=(0, 1, 0))):
        with Locations(Location((63, 3.38028169, 0), (0, 0, 64.100886192))):
            Circle(SKETCH31_R)
        with Locations(Location((-8, 3.38028169, 0), (0, 0, 115.899113808))):
            Circle(SKETCH31_R)
    extrude(amount=CUT_EXTRUDE11_DEPTH, mode=Mode.SUBTRACT)

    # Sketch32 → Cut-Extrude12 (cut)
    with BuildSketch(Plane(origin=(0, -10, 0), x_dir=(1, 0, 0), z_dir=(0, 1, 0))):
        with Locations((27.5, -14.875)):
            Rectangle(SKETCH32_W, SKETCH32_H)
    extrude(amount=-CUT_EXTRUDE12_DEPTH, mode=Mode.SUBTRACT)

    # Sketch33 → Cut-Extrude13 (cut)
    with BuildSketch(Plane(origin=(0, 80, 0), x_dir=(1, 0, 0), z_dir=(0, 1, 0))):
        with Locations((27.5, -1.5)):
            Rectangle(SKETCH33_W, SKETCH33_H)
    extrude(amount=-CUT_EXTRUDE13_DEPTH, mode=Mode.SUBTRACT)


solid = part_1.part
